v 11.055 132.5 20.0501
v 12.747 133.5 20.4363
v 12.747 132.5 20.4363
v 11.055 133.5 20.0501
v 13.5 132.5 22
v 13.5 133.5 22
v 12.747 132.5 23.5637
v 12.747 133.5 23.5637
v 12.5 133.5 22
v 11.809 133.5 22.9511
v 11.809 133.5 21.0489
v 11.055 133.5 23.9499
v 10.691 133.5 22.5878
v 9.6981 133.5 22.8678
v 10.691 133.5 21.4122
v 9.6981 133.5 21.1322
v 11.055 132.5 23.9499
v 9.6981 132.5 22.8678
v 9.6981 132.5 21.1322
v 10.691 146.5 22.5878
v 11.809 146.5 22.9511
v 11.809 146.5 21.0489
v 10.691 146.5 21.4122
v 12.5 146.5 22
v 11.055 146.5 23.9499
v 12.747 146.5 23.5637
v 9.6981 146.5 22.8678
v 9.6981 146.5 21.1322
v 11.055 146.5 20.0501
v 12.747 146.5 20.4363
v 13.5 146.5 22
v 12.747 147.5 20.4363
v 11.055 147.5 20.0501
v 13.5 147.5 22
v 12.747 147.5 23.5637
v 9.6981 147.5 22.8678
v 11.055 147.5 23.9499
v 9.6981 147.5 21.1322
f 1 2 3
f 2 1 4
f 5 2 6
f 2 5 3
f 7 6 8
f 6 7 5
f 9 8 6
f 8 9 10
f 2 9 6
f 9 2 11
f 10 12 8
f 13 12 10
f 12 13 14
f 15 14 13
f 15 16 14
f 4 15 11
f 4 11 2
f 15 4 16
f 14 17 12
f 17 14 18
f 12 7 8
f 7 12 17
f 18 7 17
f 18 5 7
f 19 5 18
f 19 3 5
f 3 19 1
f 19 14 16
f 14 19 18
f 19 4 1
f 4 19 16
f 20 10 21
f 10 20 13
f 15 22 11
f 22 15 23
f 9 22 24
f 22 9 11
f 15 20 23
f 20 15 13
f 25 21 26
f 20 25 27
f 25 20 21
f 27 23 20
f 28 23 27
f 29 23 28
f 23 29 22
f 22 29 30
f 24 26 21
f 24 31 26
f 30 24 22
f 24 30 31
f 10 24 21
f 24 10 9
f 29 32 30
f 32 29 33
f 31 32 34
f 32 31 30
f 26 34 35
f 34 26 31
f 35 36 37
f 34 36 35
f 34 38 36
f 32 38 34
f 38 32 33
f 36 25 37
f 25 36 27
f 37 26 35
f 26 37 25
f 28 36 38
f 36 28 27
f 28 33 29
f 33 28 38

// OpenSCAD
// Generated from the same CSG operations as STEP. Rebuild with spec/build_parent_hand_service.py.
translate([11.5,132.5,22]) rotate([-90,0,0]) union(){cylinder(r=2,h=1);translate([0,0,1]) cylinder(r=1,h=13);translate([0,0,14]) cylinder(r=2,h=1);}
